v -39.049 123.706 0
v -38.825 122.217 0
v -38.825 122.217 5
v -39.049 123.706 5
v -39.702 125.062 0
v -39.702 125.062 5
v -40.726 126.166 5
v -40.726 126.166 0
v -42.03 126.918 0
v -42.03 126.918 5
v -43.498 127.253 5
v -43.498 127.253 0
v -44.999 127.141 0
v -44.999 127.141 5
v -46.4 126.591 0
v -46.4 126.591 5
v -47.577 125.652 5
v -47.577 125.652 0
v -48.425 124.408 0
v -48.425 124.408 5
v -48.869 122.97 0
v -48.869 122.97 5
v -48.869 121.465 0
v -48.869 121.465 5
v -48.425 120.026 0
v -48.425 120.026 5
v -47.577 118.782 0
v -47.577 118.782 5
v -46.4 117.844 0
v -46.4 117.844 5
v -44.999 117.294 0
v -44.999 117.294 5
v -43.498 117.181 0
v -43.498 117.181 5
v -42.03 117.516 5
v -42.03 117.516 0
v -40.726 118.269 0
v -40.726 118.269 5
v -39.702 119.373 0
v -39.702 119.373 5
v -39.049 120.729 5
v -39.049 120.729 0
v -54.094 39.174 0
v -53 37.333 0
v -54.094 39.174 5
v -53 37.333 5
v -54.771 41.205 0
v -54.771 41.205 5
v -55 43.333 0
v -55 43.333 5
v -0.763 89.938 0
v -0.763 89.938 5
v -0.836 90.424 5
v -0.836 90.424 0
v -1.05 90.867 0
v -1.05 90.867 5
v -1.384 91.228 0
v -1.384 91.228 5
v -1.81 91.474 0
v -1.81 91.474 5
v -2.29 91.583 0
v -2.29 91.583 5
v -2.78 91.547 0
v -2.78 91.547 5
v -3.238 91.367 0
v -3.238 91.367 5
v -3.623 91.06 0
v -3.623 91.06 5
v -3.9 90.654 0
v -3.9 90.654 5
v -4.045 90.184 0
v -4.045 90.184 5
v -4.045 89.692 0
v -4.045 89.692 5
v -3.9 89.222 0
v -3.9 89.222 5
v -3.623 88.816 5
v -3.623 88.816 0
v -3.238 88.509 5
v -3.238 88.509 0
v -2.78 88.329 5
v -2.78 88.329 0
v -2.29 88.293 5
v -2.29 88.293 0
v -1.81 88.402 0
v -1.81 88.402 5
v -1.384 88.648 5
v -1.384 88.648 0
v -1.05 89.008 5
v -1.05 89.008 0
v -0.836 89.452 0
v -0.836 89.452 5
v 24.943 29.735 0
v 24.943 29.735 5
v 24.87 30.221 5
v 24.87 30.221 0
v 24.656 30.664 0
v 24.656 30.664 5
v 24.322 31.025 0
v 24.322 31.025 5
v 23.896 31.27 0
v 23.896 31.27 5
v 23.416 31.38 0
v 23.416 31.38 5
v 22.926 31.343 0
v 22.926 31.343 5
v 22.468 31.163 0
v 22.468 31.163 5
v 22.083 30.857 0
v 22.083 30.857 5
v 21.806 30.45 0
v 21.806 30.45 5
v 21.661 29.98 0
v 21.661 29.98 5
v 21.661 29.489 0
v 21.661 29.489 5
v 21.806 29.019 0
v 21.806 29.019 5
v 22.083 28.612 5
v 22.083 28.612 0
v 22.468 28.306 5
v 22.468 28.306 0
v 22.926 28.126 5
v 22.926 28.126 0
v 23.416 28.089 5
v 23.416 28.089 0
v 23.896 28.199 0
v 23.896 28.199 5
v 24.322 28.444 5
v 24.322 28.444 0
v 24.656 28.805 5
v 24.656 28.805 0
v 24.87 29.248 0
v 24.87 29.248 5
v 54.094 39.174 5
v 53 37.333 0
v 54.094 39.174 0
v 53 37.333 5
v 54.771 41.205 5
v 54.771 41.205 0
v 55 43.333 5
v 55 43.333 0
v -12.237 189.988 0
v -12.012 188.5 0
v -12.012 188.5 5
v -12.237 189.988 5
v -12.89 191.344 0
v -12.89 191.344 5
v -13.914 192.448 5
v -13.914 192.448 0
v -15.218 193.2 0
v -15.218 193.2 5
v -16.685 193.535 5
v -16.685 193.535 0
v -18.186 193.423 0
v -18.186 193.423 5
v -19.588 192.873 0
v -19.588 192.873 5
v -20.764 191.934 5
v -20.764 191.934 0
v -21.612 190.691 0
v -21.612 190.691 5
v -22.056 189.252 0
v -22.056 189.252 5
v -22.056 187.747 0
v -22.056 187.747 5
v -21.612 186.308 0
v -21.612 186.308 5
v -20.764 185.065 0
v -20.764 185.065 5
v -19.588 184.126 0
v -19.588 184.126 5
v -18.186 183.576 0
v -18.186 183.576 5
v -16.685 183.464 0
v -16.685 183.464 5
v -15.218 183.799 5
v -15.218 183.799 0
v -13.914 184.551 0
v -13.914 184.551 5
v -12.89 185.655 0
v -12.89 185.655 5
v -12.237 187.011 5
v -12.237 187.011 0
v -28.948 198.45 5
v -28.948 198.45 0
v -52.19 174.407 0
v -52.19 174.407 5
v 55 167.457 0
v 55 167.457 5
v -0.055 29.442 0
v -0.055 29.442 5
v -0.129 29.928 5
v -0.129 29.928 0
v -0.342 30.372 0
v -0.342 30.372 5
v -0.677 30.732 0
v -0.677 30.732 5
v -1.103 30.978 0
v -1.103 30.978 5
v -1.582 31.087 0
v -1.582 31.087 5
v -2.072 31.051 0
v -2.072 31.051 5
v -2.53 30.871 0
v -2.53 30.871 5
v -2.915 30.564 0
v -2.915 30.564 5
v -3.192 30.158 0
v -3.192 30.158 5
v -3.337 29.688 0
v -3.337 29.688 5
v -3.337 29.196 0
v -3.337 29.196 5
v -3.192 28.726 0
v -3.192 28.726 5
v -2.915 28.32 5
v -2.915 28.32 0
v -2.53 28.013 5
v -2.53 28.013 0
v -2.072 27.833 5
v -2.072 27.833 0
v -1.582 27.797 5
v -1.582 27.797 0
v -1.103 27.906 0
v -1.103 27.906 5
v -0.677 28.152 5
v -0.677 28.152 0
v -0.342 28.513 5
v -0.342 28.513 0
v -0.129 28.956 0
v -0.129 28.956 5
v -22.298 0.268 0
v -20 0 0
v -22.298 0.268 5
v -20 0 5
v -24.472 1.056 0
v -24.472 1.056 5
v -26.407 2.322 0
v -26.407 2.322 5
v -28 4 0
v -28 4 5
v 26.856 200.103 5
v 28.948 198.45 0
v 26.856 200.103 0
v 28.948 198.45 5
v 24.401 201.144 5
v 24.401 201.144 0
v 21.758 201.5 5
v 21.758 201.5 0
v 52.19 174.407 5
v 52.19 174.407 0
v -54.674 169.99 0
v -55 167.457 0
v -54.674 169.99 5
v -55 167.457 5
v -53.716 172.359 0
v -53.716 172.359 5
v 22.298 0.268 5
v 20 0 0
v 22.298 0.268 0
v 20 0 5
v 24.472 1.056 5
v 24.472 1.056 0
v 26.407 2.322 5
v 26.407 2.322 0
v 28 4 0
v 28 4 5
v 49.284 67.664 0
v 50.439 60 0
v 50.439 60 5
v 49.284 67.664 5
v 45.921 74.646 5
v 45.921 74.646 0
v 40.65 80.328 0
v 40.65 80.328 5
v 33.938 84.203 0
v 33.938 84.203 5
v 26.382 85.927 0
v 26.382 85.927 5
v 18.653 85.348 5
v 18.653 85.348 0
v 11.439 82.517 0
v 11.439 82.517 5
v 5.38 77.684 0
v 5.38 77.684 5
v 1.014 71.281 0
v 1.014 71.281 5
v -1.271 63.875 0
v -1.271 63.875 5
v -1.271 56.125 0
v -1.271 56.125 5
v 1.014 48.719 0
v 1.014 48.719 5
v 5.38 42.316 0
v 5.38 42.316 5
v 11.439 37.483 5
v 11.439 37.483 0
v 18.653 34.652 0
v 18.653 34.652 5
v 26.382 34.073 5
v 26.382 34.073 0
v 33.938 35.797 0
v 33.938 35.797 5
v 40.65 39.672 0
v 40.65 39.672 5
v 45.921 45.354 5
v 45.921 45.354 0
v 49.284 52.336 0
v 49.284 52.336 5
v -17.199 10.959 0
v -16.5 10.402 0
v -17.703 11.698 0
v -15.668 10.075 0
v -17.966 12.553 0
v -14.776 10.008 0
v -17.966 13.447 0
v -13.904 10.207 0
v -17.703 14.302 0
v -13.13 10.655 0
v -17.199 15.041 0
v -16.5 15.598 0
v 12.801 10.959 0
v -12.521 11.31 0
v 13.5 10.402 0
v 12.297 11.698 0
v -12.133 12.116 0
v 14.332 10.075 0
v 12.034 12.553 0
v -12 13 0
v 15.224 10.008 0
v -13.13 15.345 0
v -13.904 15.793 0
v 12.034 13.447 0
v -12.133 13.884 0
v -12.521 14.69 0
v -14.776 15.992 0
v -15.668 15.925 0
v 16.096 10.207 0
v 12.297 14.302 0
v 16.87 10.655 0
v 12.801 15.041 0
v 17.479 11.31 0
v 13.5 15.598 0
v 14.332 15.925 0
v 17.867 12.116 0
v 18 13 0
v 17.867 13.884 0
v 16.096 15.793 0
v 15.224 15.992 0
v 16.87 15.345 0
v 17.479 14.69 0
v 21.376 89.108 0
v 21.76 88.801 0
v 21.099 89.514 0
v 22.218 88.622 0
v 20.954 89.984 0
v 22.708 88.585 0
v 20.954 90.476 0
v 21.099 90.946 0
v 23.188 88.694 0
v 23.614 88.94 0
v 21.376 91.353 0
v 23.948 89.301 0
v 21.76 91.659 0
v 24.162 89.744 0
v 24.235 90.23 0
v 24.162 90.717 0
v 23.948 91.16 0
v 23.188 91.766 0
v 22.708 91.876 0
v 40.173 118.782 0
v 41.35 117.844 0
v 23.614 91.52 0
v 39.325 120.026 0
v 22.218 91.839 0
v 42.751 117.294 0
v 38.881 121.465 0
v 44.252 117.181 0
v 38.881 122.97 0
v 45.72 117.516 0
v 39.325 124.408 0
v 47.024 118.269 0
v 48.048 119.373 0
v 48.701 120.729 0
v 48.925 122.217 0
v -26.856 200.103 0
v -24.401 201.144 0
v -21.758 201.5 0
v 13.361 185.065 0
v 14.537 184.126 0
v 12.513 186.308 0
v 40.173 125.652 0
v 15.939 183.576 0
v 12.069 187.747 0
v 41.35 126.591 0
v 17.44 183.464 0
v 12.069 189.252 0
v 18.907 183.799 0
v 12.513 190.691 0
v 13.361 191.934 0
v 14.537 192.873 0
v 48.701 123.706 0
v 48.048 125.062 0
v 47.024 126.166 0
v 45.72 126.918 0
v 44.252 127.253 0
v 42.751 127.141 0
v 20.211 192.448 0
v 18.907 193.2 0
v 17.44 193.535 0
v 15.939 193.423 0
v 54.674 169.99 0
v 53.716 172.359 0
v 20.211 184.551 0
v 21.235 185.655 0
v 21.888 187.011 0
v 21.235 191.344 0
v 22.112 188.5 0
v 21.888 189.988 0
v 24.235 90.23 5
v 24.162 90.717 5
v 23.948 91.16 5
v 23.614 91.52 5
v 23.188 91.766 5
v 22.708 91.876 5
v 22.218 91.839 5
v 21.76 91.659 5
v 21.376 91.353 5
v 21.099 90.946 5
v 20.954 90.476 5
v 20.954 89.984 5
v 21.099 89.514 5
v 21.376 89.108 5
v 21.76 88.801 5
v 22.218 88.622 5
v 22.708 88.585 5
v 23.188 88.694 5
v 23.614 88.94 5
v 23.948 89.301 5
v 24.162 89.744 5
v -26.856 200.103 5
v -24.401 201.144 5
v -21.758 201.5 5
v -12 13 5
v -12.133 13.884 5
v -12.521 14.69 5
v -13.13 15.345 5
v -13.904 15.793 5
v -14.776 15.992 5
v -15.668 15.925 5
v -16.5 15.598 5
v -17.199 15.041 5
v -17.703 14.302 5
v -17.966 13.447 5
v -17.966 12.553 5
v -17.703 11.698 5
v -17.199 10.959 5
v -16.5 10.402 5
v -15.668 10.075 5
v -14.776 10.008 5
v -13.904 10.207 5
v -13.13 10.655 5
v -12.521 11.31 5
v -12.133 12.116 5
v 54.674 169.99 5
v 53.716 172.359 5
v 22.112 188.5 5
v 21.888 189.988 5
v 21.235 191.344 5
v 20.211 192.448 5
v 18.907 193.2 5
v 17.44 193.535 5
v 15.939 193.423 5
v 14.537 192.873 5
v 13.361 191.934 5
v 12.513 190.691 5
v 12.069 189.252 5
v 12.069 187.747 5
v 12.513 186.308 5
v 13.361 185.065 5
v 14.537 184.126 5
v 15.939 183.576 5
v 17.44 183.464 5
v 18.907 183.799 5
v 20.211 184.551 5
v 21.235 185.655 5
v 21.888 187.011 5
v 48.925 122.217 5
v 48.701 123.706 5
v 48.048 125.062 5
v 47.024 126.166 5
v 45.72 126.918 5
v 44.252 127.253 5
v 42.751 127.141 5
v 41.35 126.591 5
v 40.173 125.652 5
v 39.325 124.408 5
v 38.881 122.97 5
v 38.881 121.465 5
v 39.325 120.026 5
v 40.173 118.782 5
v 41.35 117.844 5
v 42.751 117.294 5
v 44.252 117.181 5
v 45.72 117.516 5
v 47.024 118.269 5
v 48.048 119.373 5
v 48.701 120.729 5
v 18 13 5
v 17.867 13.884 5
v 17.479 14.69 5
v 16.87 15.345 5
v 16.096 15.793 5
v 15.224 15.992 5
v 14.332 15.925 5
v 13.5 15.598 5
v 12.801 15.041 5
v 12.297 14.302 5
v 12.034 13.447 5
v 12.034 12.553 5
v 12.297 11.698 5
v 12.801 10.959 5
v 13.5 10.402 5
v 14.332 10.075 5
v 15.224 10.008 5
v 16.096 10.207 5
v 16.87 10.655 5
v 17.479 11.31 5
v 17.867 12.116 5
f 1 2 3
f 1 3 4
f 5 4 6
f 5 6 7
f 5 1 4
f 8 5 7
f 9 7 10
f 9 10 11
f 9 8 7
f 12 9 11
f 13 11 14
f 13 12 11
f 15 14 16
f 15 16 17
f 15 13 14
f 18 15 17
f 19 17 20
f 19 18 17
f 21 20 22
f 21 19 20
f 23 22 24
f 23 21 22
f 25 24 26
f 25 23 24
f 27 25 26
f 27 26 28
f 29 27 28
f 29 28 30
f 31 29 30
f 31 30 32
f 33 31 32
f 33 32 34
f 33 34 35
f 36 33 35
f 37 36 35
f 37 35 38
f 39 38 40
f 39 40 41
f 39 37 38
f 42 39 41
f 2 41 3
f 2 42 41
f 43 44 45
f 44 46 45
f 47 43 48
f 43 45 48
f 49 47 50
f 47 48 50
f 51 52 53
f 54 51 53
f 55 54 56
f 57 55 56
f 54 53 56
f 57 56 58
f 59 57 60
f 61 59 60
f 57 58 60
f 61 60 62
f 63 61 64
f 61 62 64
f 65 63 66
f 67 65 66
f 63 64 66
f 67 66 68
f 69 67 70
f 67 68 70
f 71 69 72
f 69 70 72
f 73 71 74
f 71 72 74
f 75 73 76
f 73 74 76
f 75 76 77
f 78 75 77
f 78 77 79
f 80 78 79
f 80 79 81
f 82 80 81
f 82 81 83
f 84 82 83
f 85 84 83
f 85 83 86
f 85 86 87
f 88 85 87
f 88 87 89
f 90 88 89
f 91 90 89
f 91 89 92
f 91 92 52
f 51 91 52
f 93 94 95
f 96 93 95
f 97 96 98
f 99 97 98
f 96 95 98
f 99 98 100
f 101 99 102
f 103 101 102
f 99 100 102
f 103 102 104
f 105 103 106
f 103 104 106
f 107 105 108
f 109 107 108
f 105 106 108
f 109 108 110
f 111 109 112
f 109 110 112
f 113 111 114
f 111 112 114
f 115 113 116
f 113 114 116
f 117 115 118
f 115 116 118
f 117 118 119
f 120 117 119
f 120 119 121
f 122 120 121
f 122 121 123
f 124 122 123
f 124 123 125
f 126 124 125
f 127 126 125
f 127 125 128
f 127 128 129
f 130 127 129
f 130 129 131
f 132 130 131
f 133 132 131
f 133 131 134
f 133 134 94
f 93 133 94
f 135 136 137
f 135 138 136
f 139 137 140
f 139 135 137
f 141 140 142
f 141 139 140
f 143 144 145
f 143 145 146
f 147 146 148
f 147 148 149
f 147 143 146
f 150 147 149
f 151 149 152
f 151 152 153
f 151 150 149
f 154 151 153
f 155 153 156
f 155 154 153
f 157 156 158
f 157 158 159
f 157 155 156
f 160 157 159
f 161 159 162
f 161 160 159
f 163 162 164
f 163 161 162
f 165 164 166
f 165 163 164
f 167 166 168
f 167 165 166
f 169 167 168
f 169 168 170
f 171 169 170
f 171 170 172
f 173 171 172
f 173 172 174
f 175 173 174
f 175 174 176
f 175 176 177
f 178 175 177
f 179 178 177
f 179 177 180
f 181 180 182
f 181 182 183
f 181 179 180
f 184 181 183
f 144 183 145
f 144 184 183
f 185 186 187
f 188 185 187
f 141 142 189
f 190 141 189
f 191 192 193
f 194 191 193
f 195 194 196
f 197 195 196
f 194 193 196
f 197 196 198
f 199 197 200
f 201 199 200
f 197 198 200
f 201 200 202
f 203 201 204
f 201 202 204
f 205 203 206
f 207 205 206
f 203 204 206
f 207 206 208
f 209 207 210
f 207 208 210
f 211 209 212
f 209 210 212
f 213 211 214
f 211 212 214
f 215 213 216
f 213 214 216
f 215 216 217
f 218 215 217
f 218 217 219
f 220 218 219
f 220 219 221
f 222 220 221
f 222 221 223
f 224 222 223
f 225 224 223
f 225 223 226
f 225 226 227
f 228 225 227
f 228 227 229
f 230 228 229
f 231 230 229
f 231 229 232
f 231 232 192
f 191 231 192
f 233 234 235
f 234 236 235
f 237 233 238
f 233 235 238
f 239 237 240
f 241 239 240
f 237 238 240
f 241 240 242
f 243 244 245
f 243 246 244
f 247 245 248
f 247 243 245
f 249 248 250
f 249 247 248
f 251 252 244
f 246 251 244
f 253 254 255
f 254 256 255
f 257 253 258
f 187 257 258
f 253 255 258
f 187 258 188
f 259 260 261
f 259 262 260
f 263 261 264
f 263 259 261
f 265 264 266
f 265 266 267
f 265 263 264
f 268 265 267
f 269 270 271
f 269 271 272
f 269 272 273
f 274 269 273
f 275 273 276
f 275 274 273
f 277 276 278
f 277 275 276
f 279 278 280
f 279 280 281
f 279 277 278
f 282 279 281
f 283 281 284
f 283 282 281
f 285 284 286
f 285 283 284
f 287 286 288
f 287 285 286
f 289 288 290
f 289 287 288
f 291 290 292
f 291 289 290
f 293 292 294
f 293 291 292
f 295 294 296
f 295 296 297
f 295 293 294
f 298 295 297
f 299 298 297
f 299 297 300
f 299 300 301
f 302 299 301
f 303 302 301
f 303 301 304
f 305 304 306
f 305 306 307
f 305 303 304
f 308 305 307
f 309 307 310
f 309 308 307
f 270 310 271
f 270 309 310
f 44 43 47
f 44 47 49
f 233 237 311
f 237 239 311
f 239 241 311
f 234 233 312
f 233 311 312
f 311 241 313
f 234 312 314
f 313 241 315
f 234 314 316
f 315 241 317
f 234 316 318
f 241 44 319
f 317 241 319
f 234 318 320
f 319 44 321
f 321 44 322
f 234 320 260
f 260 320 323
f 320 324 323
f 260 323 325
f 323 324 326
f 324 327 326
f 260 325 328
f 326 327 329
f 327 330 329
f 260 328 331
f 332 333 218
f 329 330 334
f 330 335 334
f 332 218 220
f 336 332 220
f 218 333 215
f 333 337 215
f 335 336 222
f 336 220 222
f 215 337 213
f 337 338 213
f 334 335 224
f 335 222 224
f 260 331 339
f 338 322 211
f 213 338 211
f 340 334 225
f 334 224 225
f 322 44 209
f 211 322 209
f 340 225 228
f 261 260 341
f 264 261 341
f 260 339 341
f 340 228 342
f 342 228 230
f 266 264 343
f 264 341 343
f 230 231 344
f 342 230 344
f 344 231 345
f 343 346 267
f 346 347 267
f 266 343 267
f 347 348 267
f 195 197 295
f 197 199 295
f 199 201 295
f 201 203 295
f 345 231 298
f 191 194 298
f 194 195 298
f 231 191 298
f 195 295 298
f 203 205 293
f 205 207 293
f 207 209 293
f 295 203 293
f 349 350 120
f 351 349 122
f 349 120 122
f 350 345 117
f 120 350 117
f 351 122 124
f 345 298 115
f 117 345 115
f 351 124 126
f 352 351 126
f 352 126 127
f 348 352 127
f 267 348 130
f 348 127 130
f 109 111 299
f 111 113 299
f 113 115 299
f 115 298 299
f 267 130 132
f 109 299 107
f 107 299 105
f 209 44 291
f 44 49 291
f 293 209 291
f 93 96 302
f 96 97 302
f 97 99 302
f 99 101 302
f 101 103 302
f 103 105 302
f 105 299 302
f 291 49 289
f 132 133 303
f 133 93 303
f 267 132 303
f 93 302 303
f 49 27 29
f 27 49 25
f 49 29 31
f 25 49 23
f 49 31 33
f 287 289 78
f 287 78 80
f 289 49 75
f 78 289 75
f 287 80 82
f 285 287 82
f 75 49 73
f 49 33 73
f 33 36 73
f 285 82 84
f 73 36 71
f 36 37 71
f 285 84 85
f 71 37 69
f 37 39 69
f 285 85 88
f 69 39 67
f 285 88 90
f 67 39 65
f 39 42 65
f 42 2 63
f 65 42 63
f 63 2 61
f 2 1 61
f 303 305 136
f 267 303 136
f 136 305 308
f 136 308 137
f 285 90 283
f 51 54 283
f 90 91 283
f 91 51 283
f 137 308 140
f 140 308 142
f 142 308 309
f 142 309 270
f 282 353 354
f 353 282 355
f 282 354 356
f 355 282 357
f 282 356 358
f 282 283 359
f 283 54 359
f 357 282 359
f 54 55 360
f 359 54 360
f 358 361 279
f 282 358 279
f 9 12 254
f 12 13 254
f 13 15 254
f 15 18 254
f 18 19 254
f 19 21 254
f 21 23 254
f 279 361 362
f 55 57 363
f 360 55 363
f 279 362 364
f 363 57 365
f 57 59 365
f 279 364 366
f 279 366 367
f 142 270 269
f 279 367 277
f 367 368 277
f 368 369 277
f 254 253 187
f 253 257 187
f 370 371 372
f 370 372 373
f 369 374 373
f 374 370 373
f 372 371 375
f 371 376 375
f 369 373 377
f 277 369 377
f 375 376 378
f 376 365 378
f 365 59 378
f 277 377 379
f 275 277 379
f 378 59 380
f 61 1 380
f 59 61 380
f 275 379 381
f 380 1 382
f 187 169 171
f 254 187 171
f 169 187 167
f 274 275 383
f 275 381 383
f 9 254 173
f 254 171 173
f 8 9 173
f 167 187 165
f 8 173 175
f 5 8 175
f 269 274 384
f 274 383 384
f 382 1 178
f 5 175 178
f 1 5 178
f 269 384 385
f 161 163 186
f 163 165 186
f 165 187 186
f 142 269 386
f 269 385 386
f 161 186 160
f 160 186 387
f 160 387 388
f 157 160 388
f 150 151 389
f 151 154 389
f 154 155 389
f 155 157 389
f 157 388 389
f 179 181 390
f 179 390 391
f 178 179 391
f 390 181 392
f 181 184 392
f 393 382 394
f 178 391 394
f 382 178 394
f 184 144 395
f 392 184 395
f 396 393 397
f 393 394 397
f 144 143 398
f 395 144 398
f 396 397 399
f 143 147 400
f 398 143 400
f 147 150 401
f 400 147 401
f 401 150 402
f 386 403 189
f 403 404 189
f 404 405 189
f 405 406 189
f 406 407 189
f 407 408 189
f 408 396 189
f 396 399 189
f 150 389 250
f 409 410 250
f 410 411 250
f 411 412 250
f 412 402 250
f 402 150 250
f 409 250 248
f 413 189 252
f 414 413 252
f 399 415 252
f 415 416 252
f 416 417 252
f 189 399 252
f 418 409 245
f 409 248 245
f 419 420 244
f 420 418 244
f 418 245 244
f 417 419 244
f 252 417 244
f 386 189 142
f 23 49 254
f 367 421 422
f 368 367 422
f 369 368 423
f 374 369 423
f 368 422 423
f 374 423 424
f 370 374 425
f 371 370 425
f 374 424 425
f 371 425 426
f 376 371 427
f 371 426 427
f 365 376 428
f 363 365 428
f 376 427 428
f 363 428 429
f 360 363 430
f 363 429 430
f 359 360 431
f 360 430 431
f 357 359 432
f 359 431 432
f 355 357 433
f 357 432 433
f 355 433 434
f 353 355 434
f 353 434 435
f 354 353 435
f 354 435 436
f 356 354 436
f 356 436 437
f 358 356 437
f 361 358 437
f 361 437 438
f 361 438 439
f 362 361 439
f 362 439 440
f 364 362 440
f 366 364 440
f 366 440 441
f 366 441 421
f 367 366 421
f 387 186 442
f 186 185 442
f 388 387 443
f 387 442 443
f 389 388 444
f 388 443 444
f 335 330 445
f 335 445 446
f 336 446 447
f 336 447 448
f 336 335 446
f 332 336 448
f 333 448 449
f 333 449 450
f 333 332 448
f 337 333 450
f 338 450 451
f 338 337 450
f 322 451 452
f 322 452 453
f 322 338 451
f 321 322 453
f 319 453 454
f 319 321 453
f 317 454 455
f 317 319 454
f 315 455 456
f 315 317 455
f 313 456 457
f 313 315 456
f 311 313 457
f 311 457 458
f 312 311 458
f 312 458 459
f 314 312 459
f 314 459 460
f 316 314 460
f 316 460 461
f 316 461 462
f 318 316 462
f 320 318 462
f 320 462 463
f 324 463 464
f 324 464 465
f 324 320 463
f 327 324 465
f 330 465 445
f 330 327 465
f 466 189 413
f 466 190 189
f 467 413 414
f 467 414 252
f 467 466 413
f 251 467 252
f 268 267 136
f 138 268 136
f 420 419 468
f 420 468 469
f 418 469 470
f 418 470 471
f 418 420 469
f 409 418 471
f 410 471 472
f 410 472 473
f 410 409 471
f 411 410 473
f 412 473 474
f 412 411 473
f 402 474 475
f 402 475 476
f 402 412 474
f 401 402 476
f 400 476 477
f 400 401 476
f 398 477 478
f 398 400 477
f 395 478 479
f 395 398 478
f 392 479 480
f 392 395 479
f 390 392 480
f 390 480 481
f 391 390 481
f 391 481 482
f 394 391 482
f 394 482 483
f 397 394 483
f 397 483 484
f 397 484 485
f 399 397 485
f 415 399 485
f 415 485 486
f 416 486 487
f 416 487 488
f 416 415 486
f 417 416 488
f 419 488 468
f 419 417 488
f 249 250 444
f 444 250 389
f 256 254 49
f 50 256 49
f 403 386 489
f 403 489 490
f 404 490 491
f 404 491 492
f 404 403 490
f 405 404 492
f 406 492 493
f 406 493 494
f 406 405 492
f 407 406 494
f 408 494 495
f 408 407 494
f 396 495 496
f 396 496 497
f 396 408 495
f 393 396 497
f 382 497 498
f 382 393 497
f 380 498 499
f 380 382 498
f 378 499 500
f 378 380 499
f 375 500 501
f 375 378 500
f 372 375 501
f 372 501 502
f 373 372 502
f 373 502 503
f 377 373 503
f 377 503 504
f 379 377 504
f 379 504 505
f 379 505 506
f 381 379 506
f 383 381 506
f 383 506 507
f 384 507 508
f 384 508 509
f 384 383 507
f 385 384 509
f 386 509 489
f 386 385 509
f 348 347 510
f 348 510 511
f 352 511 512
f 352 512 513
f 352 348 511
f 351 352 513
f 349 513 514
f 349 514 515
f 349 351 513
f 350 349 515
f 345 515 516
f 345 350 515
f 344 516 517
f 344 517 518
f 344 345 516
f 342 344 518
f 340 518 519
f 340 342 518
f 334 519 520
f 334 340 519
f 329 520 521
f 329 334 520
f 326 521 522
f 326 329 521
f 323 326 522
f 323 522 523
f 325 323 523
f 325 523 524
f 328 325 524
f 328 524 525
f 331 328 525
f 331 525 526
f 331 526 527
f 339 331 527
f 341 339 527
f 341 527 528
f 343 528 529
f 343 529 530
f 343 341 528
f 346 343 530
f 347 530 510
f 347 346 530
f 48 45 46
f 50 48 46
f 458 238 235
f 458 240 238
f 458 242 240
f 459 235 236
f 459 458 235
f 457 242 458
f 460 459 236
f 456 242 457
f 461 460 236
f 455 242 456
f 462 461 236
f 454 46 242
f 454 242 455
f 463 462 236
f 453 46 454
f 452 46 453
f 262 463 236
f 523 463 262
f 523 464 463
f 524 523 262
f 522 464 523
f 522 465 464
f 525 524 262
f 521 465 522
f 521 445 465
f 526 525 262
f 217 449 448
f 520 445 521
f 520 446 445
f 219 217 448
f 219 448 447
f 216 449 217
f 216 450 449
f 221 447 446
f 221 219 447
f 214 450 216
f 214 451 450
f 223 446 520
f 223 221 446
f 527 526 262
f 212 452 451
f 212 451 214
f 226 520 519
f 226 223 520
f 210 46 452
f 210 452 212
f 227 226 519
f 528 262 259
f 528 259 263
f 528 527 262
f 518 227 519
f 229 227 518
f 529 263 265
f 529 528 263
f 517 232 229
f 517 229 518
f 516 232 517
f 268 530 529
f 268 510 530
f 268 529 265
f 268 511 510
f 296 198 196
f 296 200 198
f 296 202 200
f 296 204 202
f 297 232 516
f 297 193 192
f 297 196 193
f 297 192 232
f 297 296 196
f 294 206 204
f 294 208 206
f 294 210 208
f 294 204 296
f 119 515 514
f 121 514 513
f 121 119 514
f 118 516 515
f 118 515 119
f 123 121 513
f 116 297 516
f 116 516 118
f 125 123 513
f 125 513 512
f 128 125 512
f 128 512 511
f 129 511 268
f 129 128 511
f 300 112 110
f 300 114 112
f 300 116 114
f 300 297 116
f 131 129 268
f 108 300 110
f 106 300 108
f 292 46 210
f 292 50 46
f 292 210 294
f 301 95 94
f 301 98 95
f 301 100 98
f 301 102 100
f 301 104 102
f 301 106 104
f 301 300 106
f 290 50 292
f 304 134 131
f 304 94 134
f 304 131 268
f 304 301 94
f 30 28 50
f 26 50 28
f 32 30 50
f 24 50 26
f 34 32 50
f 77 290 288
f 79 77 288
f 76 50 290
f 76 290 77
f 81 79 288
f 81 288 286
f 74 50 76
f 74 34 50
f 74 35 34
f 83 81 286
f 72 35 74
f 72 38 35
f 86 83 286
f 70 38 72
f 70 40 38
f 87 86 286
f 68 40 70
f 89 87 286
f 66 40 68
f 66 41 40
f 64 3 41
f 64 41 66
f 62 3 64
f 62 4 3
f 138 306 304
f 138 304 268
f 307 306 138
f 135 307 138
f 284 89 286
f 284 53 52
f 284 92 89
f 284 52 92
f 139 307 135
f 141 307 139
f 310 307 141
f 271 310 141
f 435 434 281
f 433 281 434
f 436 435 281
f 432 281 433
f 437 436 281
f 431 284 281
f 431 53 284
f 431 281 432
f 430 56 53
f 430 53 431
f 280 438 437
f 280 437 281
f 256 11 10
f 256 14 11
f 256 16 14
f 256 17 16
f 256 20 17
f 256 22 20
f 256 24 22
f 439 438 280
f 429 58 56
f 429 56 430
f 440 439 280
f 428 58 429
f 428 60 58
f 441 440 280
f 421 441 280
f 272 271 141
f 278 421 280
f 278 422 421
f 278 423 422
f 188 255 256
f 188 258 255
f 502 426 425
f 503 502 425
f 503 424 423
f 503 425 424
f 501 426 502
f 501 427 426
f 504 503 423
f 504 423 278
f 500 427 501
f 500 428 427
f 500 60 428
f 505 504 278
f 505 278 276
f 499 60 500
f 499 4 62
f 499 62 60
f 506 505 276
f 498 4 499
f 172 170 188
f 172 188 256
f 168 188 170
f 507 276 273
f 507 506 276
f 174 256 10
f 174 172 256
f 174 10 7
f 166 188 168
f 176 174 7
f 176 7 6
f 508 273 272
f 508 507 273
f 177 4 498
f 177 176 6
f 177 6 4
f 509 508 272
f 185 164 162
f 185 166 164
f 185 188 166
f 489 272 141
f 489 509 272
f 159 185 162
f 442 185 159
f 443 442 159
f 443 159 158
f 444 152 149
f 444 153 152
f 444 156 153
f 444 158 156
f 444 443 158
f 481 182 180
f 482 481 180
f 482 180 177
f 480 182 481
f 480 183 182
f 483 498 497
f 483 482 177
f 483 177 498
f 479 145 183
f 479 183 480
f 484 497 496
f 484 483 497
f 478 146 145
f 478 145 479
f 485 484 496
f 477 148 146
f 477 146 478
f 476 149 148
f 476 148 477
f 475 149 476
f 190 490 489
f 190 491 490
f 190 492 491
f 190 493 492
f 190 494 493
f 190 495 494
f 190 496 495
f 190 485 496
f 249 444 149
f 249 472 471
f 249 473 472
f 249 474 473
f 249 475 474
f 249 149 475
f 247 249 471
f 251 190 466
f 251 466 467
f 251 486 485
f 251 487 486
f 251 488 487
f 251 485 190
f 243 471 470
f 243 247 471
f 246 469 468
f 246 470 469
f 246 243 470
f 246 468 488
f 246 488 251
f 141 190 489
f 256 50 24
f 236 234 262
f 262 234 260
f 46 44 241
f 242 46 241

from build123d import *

# Parameters (mm, degrees)
SKETCH_1_R             = 26
SKETCH_1_R_2           = 3
SKETCH_1_R_3           = 5.05
EXTRUDE_1_DEPTH        = 5
FILLET_1_R             = 10
HOLE_WIZARD_M4_1_D     = 3.3
HOLE_WIZARD_M4_1_DEPTH = 10.1
HOLE_WIZARD_M4_1_TIP   = 0.991420021


with BuildPart() as part:
    # 草图1 → 凸台-拉伸1 (new body)
    with BuildSketch(Plane.XY):
        Polygon((-25, 0), (25, 0), (55, 40), (55, 171.5), (26, 201.5), (-26, 201.5), (-55, 171.5), (-55, 40), align=None)
        with Locations((24.438959159, 60)):
            Circle(SKETCH_1_R, mode=Mode.SUBTRACT)
        with Locations((15, 13)):
            Circle(SKETCH_1_R_2, mode=Mode.SUBTRACT)
        with Locations((-15, 13)):
            Circle(SKETCH_1_R_2, mode=Mode.SUBTRACT)
        with Locations((-17.0625, 188.499544236)):
            Circle(SKETCH_1_R_3, mode=Mode.SUBTRACT)
        with Locations((17.0625, 188.499544236)):
            Circle(SKETCH_1_R_3, mode=Mode.SUBTRACT)
        with Locations((-43.875, 122.217270257)):
            Circle(SKETCH_1_R_3, mode=Mode.SUBTRACT)
        with Locations((43.875, 122.217270257)):
            Circle(SKETCH_1_R_3, mode=Mode.SUBTRACT)
    extrude(amount=EXTRUDE_1_DEPTH)

    # 圆角1
    fillet_1_edges = [part.edges().sort_by_distance(p)[0] for p in [
        (-55, 40, 2.5),
        (-55, 171.5, 2.5),
        (-26, 201.5, 2.5),
        (26, 201.5, 2.5),
        (55, 171.5, 2.5),
        (55, 40, 2.5),
        (25, 0, 2.5),
        (-25, 0, 2.5),
    ]]
    fillet(fillet_1_edges, radius=FILLET_1_R)

    # M4 螺纹孔1
    with Locations(Plane(origin=(0, 0, 0), x_dir=(-1, 0, 0), z_dir=(0, 0, -1))):
        with Locations((2.413134666, 89.937895002), (-22.585154319, 90.23038054), (1.705319664, 29.442035657), (-23.292969321, 29.734521195)):
            Hole(HOLE_WIZARD_M4_1_D / 2, depth=HOLE_WIZARD_M4_1_DEPTH)
            with Locations((0, 0, -(HOLE_WIZARD_M4_1_DEPTH + HOLE_WIZARD_M4_1_TIP / 2))):  # 118° drill point
                Cone(0, HOLE_WIZARD_M4_1_D / 2, HOLE_WIZARD_M4_1_TIP, mode=Mode.SUBTRACT)


solid = part.part
